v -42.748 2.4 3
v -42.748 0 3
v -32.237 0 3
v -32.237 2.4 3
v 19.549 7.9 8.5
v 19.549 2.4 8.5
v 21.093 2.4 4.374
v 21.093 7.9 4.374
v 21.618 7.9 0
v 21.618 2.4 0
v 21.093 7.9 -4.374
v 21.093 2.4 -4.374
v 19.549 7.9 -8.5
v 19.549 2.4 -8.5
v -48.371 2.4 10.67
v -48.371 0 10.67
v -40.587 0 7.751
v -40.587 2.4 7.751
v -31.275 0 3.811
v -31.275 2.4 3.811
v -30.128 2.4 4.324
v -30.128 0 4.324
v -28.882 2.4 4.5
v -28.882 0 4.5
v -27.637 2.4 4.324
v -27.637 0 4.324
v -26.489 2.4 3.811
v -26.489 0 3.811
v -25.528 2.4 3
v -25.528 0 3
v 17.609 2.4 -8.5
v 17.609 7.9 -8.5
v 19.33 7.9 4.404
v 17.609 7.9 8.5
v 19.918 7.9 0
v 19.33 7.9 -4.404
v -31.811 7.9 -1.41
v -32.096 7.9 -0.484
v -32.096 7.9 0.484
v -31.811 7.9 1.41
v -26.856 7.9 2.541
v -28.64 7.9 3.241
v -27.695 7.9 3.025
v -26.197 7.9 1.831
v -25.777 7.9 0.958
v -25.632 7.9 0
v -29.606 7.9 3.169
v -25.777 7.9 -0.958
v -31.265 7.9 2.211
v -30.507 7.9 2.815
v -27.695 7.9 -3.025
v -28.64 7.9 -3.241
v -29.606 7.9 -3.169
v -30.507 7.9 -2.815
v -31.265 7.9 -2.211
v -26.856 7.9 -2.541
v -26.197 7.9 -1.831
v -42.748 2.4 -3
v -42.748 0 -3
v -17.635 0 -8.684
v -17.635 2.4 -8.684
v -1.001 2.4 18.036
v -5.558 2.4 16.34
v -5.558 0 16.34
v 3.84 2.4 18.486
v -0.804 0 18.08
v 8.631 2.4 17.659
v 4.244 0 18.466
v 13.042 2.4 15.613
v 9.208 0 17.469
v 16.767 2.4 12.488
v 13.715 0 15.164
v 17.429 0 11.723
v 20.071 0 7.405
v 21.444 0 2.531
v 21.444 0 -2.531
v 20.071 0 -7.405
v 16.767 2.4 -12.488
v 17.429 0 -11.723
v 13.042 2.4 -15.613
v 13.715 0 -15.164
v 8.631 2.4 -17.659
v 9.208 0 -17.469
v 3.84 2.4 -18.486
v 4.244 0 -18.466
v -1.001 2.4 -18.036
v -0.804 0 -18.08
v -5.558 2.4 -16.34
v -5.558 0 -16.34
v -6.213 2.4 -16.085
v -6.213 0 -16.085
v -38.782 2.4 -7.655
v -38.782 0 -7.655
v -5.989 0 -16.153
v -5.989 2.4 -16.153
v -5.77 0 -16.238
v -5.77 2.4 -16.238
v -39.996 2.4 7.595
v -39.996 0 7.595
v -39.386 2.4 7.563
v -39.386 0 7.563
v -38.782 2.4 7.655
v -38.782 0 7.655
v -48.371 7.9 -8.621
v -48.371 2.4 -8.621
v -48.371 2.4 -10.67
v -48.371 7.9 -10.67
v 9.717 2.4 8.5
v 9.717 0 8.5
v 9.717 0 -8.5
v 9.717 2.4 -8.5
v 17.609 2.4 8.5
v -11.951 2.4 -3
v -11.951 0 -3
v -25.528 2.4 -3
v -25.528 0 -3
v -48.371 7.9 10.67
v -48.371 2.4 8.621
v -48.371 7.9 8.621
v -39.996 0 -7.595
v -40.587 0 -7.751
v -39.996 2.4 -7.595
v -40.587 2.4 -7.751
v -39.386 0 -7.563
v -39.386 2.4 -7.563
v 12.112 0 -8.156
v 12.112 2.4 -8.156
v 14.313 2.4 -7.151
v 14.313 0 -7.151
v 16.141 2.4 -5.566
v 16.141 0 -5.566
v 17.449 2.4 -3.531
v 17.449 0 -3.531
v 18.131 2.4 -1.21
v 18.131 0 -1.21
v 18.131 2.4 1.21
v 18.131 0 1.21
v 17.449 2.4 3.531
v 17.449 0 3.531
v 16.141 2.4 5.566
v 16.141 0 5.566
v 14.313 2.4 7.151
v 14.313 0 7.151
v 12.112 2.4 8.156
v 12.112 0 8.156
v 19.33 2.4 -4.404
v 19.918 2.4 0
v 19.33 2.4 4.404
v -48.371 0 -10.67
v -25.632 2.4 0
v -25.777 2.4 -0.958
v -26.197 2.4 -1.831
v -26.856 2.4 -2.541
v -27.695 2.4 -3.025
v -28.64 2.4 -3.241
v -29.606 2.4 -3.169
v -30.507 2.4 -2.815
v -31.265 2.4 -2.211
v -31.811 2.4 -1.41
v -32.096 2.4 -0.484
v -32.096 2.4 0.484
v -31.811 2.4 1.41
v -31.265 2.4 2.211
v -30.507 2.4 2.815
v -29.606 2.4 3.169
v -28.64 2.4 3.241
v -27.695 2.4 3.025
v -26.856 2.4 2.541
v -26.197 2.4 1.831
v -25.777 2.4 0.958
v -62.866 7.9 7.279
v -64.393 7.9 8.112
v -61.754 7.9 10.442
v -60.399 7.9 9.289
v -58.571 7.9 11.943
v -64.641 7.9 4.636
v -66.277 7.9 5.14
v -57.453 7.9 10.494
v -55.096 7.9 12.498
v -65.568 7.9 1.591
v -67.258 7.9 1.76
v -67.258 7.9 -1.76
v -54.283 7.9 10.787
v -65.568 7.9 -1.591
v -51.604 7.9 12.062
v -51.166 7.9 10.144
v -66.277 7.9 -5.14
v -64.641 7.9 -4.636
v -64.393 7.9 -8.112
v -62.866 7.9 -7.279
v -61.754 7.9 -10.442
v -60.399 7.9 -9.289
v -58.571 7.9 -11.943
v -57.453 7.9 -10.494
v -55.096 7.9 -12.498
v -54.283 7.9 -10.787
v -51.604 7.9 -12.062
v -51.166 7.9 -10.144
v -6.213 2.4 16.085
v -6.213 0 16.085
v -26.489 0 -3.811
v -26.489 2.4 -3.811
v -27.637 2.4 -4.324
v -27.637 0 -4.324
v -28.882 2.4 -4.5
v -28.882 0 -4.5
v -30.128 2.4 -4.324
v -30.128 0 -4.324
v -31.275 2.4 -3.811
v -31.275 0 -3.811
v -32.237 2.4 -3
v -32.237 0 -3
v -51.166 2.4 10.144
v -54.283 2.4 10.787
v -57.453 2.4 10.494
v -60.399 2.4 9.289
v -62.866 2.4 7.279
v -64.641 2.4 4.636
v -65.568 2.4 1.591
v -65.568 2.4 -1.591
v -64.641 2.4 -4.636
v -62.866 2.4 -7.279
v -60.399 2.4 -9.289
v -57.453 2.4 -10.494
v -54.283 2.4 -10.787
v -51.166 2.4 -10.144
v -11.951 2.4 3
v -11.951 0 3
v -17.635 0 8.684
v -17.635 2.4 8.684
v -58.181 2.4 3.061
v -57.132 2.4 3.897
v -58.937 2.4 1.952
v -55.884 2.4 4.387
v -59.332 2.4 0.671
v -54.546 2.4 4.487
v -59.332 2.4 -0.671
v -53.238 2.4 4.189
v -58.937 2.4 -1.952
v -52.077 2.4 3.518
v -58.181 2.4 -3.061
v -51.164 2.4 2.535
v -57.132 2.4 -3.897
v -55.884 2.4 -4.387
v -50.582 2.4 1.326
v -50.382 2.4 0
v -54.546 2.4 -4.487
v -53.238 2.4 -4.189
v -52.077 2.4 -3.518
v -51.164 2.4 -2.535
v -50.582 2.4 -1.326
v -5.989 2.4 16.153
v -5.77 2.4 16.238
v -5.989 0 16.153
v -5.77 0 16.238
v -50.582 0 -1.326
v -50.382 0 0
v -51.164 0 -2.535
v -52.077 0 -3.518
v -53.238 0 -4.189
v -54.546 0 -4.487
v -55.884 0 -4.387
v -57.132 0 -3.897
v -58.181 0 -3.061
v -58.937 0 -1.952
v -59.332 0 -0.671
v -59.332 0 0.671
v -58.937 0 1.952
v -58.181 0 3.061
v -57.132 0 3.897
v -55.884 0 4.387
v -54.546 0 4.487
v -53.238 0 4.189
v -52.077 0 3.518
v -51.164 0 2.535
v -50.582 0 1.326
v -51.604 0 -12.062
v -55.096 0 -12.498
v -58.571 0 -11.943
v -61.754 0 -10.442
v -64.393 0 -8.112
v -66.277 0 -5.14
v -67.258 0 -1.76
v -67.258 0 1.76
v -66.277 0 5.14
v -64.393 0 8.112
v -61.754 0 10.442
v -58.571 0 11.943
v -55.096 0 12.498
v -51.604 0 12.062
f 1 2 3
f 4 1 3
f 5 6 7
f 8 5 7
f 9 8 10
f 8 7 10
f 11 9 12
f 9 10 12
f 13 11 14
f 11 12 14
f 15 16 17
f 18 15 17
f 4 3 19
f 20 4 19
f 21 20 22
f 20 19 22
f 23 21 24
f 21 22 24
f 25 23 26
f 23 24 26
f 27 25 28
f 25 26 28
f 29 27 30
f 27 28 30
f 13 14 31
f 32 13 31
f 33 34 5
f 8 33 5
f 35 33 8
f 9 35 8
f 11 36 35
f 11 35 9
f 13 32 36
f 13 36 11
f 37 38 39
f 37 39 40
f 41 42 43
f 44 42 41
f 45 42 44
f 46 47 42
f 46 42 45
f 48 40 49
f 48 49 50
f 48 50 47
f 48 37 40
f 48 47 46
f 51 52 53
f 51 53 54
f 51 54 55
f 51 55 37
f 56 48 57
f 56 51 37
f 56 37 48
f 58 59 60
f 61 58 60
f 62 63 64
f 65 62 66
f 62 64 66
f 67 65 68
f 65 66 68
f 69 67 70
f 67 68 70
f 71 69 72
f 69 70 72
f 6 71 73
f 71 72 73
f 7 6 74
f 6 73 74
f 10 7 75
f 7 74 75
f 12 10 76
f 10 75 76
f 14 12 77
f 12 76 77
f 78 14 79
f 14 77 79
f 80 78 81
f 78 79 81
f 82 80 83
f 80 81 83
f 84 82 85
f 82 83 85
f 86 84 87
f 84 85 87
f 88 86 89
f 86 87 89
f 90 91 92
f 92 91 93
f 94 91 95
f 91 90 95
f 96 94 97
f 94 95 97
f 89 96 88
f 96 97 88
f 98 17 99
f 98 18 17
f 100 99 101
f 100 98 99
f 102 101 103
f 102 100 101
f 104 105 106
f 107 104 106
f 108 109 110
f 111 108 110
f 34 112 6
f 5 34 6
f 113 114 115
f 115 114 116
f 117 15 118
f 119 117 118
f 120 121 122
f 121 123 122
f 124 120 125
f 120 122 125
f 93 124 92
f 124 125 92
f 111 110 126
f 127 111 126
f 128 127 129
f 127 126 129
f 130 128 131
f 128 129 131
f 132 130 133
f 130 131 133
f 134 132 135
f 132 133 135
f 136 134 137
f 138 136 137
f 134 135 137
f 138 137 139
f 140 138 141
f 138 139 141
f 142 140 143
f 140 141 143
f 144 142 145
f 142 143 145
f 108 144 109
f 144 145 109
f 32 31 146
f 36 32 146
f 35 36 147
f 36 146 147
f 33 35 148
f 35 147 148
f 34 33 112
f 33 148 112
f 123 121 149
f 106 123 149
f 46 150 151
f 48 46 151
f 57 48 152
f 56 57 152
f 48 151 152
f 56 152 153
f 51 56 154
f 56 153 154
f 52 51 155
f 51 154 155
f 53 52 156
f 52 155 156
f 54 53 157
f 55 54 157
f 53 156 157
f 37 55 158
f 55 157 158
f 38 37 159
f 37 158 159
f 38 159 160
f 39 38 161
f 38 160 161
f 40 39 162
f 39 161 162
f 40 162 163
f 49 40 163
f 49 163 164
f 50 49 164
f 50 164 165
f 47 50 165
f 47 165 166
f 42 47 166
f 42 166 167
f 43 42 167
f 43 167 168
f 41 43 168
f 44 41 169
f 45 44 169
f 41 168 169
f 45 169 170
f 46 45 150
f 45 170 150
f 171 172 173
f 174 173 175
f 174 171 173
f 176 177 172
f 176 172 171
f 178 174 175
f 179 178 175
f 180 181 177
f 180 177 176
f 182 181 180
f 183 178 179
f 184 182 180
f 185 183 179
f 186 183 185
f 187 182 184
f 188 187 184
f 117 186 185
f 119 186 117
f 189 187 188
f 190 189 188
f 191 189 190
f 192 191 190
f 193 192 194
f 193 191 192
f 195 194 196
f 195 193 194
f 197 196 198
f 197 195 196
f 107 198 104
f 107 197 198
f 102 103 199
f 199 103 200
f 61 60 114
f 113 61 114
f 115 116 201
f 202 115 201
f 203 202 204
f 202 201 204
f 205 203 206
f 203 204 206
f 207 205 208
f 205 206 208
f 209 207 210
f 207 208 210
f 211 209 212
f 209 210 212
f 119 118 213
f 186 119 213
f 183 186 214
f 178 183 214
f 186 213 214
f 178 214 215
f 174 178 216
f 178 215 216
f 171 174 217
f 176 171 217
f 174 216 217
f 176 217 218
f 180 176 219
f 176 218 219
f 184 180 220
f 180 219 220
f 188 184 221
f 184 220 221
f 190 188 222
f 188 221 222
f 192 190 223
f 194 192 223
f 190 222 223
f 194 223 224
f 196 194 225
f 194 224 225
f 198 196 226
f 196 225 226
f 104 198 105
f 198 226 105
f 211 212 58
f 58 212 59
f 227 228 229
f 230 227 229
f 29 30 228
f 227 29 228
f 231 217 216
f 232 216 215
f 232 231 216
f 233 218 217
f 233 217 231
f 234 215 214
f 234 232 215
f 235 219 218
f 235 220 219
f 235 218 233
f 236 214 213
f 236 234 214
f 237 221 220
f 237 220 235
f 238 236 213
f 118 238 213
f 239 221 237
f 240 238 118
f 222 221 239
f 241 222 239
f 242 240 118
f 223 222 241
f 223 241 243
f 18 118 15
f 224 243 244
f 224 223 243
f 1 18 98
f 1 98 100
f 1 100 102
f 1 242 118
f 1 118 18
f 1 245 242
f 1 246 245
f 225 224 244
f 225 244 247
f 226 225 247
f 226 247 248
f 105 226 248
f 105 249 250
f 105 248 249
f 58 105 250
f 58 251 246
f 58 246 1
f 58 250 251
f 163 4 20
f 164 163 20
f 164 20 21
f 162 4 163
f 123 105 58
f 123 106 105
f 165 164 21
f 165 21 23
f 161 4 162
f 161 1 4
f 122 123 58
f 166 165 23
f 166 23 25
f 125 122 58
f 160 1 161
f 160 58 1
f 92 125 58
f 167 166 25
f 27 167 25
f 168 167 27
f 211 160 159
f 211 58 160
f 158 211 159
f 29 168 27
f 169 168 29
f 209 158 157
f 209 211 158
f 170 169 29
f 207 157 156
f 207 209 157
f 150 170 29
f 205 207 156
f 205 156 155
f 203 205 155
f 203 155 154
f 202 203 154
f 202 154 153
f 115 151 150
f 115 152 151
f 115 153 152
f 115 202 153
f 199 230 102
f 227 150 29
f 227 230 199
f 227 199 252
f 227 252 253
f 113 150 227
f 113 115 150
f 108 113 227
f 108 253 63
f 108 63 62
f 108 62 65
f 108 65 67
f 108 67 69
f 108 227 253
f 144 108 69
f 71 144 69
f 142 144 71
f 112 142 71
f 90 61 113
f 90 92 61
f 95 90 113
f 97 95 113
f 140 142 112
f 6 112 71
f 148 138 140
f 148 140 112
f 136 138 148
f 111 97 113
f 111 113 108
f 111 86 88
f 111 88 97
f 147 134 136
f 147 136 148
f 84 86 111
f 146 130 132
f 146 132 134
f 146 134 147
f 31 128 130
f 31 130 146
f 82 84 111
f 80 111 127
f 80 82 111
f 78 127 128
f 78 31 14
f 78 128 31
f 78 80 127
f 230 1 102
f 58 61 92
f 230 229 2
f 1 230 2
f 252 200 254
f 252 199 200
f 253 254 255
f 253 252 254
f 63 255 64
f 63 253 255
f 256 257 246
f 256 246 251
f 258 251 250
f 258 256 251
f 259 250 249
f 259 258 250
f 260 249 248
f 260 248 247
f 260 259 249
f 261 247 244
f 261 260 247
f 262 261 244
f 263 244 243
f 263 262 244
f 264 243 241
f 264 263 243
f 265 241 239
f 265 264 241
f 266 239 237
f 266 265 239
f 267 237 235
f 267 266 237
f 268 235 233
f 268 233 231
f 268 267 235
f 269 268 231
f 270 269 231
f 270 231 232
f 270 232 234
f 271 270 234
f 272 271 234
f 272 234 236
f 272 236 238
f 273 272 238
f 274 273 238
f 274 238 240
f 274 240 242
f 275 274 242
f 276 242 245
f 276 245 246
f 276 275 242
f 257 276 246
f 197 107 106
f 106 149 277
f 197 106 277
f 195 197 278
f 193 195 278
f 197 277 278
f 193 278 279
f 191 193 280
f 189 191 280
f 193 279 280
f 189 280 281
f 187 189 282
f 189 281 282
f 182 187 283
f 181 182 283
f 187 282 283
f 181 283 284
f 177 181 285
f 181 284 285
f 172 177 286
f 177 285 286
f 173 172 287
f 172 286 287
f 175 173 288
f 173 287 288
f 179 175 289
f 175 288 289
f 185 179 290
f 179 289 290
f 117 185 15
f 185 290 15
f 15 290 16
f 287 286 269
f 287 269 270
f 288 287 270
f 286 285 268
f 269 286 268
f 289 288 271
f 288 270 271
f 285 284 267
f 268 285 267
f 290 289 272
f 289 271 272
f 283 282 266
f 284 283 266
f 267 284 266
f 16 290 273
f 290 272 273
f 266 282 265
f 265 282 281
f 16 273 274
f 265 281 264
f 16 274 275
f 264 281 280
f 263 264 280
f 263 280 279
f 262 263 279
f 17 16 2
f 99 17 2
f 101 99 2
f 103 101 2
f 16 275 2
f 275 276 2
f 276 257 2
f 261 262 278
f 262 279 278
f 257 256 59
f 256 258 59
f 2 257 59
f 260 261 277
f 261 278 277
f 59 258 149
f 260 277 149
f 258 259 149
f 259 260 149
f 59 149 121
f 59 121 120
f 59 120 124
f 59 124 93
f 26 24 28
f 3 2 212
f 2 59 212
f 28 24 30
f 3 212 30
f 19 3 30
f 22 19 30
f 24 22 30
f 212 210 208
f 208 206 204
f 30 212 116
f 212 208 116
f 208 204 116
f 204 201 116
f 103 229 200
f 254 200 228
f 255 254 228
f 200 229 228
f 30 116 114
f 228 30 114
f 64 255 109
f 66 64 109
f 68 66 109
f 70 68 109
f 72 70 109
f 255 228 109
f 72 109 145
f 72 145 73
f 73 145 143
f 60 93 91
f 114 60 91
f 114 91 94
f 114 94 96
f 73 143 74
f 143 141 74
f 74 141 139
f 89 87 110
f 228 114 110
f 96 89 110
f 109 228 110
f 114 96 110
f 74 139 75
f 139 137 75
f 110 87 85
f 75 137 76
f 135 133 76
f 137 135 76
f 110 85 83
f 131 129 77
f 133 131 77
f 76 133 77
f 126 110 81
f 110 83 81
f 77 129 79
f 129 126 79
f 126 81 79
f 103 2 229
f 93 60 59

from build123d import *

# Parameters (mm, degrees)
SKETCH1_R           = 4.5
BOSS_EXTRUDE1_DEPTH = 2.4
FILLET1_R           = 3
SKETCH2_R           = 3.25
BOSS_EXTRUDE2_DEPTH = 5.5


with BuildPart() as part:
    # Sketch1 → Boss-Extrude1 (new body)
    with BuildSketch(Plane(origin=(0, 0, 0), x_dir=(1, 0, 0), z_dir=(0, 1, 0))):
        with BuildLine():
            ThreePointArc((-48.371159118, 10.670216357), (-67.382417284, 0), (-48.371159118, -10.670216357))
            Line((-48.371159118, -10.670216357), (-39.699633202, -7.41775842))
            Line((-39.699633202, -7.41775842), (-5.857739229, -16.176946436))
            ThreePointArc((-5.857739229, -16.176946436), (21.617582716, 0), (-5.857739229, 16.176946436))
            Line((-5.857739229, 16.176946436), (-39.699633202, 7.41775842))
            Line((-39.699633202, 7.41775842), (-48.371159118, 10.670216357))
        make_face()
        with BuildLine():
            Line((-11.950545902, 3), (-25.528315318, 3))
            ThreePointArc((-25.528315318, 3), (-28.882417284, 4.5), (-32.23651925, 3))
            Line((-32.23651925, 3), (-42.747756184, 3))
            Line((-42.747756184, 3), (-17.634945081, 8.68439918))
            Line((-17.634945081, 8.68439918), (-11.950545902, 3))
        make_face(mode=Mode.SUBTRACT)
        with BuildLine():
            Line((9.717339795, -8.5), (9.717339795, 8.5))
            ThreePointArc((9.717339795, 8.5), (18.217339795, 0), (9.717339795, -8.5))
        make_face(mode=Mode.SUBTRACT)
        with BuildLine():
            Line((-42.747756184, -3), (-32.23651925, -3))
            ThreePointArc((-32.23651925, -3), (-28.882417284, -4.5), (-25.528315318, -3))
            Line((-25.528315318, -3), (-11.950545902, -3))
            Line((-11.950545902, -3), (-17.634945081, -8.68439918))
            Line((-17.634945081, -8.68439918), (-42.747756184, -3))
        make_face(mode=Mode.SUBTRACT)
        with Locations((-54.882417284, 0)):
            Circle(SKETCH1_R, mode=Mode.SUBTRACT)
    extrude(amount=BOSS_EXTRUDE1_DEPTH)

    # Fillet1
    fillet1_edges = [part.edges().sort_by_distance(p)[0] for p in [
        (-39.699633202, 1.2, -7.41775842),
        (-5.857739229, 1.2, -16.176946436),
        (-5.857739229, 1.2, 16.176946436),
        (-39.699633202, 1.2, 7.41775842),
    ]]
    fillet(fillet1_edges, radius=FILLET1_R)

    # Sketch2 → Boss-Extrude2 (add)
    with BuildSketch(Plane(origin=(0, 2.4, 0), x_dir=(1, 0, 0), z_dir=(0, 1, 0))):
        with Locations((-28.882417284, 0)):
            Circle(SKETCH2_R)
        with BuildLine():
            Line((-48.371159118, 8.621240559), (-48.371159118, 10.670216357))
            ThreePointArc((-48.371159118, 10.670216357), (-67.382417284, 0), (-48.371159118, -10.670216357))
            Line((-48.371159118, -10.670216357), (-48.371159118, -8.621240559))
            ThreePointArc((-48.371159118, -8.621240559), (-65.686225486, 0), (-48.371159118, 8.621240559))
        make_face()
        with BuildLine():
            Line((19.549259441, 8.5), (17.608614425, 8.5))
            ThreePointArc((17.608614425, 8.5), (19.917582716, 0), (17.608614425, -8.5))
            Line((17.608614425, -8.5), (19.549259441, -8.5))
            ThreePointArc((19.549259441, -8.5), (21.617582716, 0), (19.549259441, 8.5))
        make_face()
    extrude(amount=BOSS_EXTRUDE2_DEPTH)


solid = part.part
